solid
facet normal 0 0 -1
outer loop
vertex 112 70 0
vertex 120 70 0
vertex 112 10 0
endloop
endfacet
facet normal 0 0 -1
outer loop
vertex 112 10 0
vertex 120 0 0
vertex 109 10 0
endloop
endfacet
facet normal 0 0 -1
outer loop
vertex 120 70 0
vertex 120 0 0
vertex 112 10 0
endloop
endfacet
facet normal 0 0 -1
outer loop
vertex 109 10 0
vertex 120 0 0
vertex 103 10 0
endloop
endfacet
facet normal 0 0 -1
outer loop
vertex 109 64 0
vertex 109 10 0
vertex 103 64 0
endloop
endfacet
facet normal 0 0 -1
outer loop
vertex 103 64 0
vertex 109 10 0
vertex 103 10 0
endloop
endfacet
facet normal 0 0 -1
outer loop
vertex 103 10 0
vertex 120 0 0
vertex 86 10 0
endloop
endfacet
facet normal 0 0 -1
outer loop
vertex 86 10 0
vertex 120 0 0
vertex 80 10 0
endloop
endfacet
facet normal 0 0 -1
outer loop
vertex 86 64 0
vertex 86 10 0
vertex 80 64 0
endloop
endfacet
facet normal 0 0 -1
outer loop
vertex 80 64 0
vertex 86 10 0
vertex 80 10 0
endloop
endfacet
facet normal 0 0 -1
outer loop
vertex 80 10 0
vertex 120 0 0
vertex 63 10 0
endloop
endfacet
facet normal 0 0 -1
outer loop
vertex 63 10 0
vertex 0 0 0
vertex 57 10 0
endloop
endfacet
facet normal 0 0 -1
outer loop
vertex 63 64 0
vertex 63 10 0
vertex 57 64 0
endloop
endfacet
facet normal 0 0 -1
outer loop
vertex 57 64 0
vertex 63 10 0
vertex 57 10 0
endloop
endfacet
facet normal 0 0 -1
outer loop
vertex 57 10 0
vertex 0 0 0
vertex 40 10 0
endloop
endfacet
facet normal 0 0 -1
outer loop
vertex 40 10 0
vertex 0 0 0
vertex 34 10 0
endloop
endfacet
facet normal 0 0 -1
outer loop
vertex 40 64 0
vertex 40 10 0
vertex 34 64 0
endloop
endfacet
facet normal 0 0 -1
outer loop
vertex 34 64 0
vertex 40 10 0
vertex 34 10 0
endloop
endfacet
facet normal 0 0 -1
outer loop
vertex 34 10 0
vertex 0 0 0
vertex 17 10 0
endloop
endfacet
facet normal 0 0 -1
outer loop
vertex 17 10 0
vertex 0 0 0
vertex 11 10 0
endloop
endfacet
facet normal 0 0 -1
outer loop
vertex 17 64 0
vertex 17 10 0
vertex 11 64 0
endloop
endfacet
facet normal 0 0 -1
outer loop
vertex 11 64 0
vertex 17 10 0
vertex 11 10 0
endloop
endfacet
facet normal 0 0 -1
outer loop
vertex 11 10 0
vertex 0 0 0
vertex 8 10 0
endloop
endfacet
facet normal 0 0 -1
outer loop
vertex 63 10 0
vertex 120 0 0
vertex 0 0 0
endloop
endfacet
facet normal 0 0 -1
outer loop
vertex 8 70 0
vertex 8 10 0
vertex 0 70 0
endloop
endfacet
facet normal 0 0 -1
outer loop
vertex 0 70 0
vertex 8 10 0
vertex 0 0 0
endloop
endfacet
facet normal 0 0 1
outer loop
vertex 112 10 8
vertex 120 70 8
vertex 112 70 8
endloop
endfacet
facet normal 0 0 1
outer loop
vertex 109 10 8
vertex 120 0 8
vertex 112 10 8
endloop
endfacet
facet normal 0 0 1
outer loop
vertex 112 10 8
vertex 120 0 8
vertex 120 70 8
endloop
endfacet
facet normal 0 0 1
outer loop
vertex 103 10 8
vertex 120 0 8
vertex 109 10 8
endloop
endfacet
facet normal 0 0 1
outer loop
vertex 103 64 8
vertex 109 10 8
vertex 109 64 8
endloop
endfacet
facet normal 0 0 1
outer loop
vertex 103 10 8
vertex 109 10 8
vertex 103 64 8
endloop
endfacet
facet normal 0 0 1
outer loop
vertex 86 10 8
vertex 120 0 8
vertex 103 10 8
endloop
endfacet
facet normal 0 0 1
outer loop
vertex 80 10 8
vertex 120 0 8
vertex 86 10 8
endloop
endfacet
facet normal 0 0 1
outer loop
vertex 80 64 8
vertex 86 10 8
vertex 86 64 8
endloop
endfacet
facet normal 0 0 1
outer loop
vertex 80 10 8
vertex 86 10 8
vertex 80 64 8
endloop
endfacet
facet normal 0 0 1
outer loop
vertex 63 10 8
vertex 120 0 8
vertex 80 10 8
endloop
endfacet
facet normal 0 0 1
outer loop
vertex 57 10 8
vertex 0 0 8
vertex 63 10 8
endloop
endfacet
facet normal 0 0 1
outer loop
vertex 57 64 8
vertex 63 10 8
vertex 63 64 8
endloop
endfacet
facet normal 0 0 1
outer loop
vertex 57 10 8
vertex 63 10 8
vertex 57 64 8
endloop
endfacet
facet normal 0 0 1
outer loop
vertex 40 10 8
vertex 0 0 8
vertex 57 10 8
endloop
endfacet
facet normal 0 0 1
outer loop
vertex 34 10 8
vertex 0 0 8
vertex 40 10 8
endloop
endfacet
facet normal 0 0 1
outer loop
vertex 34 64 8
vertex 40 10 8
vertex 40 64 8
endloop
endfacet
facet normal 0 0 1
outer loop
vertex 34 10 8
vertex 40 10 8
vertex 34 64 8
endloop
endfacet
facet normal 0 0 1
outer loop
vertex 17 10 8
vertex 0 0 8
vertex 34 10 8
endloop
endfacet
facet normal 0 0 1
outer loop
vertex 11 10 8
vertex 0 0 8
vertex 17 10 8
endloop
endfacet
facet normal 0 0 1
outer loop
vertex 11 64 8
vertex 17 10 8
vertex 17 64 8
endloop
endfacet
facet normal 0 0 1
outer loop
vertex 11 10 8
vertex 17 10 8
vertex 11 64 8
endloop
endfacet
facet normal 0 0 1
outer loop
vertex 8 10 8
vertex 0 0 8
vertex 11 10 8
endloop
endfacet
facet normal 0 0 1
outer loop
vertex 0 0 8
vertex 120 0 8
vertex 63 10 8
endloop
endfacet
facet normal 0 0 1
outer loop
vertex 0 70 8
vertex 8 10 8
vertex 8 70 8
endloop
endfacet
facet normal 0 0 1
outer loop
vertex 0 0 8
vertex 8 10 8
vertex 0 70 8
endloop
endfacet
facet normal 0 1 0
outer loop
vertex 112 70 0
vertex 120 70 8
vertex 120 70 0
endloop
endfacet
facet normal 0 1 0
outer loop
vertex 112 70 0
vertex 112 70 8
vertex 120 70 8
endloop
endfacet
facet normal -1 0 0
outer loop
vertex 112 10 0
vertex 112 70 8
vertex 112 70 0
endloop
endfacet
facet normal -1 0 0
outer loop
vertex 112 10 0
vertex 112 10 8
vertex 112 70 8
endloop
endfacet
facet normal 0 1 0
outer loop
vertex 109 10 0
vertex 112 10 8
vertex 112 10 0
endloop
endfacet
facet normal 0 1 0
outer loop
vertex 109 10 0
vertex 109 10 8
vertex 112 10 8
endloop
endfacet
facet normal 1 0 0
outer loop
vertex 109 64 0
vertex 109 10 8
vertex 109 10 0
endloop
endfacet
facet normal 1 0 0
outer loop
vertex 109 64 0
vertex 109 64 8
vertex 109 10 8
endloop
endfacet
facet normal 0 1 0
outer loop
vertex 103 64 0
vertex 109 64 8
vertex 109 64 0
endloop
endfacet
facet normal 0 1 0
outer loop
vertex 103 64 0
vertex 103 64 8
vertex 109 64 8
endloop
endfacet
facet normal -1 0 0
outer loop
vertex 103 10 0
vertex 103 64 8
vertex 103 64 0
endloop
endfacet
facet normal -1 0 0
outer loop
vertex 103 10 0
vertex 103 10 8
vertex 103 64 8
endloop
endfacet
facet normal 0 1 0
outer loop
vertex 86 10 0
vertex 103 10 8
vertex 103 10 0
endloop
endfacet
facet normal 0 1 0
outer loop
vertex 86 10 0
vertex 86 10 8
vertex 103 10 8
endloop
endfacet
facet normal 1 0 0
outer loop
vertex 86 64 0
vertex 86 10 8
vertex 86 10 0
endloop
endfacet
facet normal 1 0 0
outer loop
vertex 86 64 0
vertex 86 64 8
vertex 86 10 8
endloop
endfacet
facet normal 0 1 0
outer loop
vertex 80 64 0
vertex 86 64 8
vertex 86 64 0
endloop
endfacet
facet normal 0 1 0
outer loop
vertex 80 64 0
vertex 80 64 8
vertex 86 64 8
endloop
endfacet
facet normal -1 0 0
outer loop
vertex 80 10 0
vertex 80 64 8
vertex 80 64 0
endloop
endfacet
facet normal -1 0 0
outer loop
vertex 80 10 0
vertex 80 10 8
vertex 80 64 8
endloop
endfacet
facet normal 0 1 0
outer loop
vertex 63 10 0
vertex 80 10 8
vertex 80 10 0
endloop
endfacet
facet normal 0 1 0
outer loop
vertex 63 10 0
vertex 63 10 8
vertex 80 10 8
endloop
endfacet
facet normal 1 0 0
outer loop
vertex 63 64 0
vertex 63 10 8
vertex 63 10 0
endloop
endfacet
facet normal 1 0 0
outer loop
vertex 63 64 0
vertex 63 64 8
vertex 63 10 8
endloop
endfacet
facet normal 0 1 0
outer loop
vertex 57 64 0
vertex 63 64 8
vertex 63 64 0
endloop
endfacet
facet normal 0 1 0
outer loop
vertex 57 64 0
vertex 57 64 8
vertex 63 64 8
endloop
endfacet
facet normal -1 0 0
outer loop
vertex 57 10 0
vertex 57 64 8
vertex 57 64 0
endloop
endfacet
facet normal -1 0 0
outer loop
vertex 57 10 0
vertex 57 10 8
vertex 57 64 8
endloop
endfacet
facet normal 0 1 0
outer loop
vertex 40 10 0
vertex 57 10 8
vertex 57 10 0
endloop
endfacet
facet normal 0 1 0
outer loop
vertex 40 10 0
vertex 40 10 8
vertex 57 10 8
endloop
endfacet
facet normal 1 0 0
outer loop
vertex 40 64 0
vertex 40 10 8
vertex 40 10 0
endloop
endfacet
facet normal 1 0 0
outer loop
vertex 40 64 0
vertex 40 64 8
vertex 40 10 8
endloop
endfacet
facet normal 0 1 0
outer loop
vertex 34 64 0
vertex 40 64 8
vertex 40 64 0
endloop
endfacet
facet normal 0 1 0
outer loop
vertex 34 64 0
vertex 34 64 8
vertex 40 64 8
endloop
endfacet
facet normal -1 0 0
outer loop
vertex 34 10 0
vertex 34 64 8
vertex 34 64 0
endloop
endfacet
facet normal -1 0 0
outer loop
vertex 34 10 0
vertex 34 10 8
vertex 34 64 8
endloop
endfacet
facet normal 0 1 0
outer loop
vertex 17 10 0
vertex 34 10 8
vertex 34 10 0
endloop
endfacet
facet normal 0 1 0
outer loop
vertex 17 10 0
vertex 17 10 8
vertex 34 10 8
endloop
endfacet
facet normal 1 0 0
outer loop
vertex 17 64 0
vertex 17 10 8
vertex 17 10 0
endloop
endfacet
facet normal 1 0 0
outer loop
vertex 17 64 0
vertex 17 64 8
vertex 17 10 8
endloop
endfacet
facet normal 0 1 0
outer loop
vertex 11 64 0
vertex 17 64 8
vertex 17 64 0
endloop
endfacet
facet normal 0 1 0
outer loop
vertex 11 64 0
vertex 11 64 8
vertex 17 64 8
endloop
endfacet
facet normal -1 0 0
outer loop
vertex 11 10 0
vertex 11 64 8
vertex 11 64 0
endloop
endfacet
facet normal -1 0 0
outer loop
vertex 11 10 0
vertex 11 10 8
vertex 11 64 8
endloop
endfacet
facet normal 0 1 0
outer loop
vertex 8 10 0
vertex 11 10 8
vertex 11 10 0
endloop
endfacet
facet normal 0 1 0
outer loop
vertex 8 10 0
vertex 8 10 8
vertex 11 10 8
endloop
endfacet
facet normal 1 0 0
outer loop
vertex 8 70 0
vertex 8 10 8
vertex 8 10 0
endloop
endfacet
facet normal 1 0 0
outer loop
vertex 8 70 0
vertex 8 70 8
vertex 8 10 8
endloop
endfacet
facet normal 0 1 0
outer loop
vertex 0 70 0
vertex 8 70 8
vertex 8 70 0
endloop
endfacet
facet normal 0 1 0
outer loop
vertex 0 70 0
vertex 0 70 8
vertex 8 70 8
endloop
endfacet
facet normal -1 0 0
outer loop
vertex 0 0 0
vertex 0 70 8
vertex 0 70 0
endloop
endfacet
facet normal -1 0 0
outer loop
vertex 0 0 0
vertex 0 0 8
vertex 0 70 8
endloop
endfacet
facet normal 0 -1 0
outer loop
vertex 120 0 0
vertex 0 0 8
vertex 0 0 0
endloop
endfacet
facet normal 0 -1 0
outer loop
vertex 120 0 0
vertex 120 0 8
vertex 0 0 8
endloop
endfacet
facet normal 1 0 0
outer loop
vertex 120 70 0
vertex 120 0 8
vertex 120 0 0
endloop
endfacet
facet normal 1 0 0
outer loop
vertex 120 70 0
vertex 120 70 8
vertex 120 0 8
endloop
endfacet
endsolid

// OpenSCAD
$fn = 32;

// ----------------------------------------------------------------------
// Guard grille: 5 slats over a 120 x 70 mm plate
// ----------------------------------------------------------------------

// --- parameters (mm) ---
profile_height = 8;       // extrusion height
profile_points = 28;      // points of the closed outline

profile = [[0, 0], [120, 0], [120, 70], [112, 70], [112, 10], [109, 10], [109, 64], [103, 64], [103, 10], [86, 10], [86, 64], [80, 64], [80, 10], [63, 10], [63, 64], [57, 64], [57, 10], [40, 10], [40, 64], [34, 64], [34, 10], [17, 10], [17, 64], [11, 64], [11, 10], [8, 10], [8, 70], [0, 70]];  // single closed polygon, 28 points, counter clockwise

// --- the one profile operation ---
linear_extrude(height = profile_height) polygon(points = profile);
